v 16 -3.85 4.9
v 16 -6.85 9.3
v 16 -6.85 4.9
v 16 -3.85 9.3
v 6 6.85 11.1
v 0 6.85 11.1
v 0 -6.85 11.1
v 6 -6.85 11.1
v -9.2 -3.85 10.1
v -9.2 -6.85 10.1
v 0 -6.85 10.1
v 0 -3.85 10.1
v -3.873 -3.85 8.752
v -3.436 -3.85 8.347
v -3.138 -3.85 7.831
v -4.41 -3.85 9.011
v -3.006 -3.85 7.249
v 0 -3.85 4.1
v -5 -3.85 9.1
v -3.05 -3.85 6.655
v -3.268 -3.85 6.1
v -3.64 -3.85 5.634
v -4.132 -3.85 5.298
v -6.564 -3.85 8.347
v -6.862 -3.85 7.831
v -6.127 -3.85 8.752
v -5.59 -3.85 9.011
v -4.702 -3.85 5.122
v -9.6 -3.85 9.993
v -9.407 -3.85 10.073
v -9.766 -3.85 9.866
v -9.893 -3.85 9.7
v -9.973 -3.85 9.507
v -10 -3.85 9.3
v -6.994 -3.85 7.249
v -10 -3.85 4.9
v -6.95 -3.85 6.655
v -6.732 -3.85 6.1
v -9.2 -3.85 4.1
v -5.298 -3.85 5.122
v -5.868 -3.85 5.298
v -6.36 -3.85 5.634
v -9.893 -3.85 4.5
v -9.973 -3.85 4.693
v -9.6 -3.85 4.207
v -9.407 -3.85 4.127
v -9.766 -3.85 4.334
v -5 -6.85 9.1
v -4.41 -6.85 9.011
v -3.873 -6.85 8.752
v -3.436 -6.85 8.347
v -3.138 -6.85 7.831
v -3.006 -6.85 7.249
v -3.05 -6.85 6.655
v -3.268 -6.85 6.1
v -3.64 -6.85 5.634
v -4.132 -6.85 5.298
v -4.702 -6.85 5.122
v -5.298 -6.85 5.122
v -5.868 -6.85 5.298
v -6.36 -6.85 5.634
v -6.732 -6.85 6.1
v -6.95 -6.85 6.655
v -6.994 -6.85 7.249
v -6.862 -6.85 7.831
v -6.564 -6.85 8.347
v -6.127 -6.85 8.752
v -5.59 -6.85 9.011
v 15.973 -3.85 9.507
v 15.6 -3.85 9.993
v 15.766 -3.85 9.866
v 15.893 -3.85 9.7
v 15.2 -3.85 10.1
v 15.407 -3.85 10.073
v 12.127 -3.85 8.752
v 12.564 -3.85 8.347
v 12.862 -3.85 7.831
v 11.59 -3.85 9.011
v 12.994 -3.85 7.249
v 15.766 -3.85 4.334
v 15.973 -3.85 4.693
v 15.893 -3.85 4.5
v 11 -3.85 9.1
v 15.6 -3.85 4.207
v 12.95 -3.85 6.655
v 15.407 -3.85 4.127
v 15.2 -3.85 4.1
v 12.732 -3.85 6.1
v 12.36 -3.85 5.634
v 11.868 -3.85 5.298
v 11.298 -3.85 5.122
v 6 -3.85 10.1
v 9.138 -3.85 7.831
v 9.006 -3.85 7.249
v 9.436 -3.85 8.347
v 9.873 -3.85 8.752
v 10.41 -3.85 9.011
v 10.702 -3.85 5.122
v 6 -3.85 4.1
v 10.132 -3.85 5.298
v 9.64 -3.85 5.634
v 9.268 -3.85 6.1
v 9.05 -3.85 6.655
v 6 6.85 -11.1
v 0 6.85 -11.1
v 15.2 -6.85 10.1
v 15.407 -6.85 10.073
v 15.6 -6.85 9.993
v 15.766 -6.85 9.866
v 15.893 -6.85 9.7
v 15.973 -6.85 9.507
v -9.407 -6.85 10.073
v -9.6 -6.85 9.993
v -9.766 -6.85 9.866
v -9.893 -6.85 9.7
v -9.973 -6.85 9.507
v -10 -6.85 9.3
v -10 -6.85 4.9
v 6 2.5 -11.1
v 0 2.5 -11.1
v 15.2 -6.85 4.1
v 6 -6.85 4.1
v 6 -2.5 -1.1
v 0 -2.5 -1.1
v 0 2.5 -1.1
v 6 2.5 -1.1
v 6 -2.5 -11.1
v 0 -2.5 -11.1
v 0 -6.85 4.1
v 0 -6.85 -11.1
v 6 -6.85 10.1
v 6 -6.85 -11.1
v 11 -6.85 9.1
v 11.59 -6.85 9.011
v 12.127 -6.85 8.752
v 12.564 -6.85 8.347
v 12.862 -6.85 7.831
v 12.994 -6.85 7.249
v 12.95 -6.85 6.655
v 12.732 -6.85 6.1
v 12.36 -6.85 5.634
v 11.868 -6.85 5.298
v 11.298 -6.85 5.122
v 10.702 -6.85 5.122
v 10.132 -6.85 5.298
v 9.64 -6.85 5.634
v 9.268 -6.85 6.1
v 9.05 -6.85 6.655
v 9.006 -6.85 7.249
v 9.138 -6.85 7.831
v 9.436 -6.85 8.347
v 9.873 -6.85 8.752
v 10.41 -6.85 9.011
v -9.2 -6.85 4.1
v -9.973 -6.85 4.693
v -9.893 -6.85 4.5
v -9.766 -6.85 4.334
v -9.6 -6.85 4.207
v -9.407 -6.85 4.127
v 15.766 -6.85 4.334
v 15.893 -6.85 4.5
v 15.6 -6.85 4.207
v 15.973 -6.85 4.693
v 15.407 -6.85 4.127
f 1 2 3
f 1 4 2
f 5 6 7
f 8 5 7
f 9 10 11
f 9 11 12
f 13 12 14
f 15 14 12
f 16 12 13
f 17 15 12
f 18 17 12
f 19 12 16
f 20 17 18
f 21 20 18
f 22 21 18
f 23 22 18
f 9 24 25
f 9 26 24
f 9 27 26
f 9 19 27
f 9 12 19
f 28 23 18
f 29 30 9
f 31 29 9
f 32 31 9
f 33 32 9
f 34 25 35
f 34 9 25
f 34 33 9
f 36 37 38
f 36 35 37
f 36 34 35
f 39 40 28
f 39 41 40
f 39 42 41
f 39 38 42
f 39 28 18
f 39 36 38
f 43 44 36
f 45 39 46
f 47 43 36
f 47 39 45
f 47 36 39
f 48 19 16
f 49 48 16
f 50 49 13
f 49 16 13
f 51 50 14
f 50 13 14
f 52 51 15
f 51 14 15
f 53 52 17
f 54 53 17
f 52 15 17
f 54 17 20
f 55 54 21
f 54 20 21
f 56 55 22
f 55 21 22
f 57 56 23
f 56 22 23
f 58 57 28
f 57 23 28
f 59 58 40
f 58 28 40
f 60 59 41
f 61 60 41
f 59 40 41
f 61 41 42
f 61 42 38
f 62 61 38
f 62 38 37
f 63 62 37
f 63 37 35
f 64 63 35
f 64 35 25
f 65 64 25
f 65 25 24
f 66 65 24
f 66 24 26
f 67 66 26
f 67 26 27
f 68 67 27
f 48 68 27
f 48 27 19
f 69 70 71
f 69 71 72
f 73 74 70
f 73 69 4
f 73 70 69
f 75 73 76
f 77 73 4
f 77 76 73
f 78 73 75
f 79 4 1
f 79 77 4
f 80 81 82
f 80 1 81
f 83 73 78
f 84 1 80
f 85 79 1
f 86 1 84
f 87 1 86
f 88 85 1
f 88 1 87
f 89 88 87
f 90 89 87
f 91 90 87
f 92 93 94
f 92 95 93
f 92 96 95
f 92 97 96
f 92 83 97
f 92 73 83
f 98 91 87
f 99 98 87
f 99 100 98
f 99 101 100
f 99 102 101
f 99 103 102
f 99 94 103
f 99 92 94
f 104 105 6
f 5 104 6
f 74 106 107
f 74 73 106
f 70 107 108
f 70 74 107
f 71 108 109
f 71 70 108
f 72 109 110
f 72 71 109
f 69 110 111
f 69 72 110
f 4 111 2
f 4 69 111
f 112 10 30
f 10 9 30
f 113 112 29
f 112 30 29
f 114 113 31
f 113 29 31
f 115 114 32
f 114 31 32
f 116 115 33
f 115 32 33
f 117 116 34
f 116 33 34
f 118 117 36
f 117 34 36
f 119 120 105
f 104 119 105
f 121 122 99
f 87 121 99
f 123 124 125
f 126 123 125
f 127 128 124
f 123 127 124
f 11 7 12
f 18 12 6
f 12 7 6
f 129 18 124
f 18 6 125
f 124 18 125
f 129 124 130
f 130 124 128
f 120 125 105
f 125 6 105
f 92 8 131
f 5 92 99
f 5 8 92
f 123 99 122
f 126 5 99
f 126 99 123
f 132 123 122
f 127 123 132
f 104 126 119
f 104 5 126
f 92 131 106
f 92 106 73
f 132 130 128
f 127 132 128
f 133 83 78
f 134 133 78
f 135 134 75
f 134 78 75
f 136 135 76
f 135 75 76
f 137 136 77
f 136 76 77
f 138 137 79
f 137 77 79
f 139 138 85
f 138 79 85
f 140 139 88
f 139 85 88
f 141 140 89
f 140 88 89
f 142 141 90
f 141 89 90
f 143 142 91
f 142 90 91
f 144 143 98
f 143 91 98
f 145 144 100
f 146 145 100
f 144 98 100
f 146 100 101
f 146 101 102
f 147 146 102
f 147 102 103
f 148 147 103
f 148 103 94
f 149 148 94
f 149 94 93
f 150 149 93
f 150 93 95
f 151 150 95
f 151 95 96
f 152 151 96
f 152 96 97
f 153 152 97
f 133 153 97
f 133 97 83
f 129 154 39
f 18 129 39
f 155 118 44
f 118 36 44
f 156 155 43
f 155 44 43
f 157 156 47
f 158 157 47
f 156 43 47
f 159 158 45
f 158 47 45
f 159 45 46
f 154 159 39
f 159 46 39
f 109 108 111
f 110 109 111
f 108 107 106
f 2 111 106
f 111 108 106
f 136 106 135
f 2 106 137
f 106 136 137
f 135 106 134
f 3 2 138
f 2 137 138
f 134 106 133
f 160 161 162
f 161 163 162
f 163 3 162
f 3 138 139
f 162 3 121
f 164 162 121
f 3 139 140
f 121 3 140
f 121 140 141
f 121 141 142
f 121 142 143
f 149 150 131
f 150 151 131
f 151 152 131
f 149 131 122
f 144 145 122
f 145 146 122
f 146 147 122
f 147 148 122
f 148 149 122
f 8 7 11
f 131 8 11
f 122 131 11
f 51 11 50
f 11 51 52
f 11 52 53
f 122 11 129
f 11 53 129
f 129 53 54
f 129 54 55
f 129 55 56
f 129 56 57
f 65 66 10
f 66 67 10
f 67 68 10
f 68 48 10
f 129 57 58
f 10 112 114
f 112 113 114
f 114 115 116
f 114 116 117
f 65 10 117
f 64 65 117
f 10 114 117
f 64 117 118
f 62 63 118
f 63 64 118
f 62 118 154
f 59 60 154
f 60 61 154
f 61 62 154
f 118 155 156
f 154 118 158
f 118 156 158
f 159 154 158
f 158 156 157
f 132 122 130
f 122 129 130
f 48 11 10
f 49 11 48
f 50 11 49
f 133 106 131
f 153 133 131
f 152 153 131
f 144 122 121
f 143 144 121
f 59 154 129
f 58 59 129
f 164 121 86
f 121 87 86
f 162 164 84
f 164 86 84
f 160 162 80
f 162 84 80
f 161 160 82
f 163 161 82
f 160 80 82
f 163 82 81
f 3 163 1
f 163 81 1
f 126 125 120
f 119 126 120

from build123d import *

# Parameters (mm, degrees)
BOSS_EXTRUDE1_DEPTH      = 6
BOSS_EXTRUDE2_DEPTH      = 10
BOSS_EXTRUDE2_DEPTH_BACK = 16
SKETCH2_W                = 6
SKETCH2_H                = 3
SKETCH3_R                = 2
CUT_EXTRUDE1_DEPTH       = 10
FILLET1_R                = 0.8


with BuildPart() as part:
    # Sketch1 → Boss-Extrude1 (new body)
    with BuildSketch(Plane(origin=(0, 0, 0), x_dir=(0, 0, -1), z_dir=(1, 0, 0))):
        Polygon((11.1, 6.85), (-11.1, 6.85), (-11.1, -6.85), (11.1, -6.85), (11.1, -2.5), (1.1, -2.5), (1.1, 2.5), (11.1, 2.5), align=None)
    extrude(amount=BOSS_EXTRUDE1_DEPTH)

    # Sketch2 → Boss-Extrude2 (add, two sides: drawn at the far end of the back side and taken through both)
    with BuildSketch(Plane(origin=(6, 0, 0), x_dir=(0, 0, -1), z_dir=(1, 0, 0)).offset(-BOSS_EXTRUDE2_DEPTH_BACK)):
        with Locations((-7.1, -5.35)):
            Rectangle(SKETCH2_W, SKETCH2_H)
    extrude(amount=BOSS_EXTRUDE2_DEPTH + BOSS_EXTRUDE2_DEPTH_BACK)

    # Sketch3 → Cut-Extrude1 (cut)
    with BuildSketch(Plane(origin=(0, -3.85, 0), x_dir=(1, 0, 0), z_dir=(0, 1, 0))):
        with Locations((11, -7.1)):
            Circle(SKETCH3_R)
        with Locations((-5, -7.1)):
            Circle(SKETCH3_R)
    extrude(amount=-CUT_EXTRUDE1_DEPTH, mode=Mode.SUBTRACT)

    # Fillet1
    fillet1_edges = [part.edges().sort_by_distance(p)[0] for p in [
        (16, -5.35, 10.1),
        (16, -5.35, 4.1),
        (-10, -5.35, 10.1),
        (-10, -5.35, 4.1),
    ]]
    fillet(fillet1_edges, radius=FILLET1_R)


solid = part.part
